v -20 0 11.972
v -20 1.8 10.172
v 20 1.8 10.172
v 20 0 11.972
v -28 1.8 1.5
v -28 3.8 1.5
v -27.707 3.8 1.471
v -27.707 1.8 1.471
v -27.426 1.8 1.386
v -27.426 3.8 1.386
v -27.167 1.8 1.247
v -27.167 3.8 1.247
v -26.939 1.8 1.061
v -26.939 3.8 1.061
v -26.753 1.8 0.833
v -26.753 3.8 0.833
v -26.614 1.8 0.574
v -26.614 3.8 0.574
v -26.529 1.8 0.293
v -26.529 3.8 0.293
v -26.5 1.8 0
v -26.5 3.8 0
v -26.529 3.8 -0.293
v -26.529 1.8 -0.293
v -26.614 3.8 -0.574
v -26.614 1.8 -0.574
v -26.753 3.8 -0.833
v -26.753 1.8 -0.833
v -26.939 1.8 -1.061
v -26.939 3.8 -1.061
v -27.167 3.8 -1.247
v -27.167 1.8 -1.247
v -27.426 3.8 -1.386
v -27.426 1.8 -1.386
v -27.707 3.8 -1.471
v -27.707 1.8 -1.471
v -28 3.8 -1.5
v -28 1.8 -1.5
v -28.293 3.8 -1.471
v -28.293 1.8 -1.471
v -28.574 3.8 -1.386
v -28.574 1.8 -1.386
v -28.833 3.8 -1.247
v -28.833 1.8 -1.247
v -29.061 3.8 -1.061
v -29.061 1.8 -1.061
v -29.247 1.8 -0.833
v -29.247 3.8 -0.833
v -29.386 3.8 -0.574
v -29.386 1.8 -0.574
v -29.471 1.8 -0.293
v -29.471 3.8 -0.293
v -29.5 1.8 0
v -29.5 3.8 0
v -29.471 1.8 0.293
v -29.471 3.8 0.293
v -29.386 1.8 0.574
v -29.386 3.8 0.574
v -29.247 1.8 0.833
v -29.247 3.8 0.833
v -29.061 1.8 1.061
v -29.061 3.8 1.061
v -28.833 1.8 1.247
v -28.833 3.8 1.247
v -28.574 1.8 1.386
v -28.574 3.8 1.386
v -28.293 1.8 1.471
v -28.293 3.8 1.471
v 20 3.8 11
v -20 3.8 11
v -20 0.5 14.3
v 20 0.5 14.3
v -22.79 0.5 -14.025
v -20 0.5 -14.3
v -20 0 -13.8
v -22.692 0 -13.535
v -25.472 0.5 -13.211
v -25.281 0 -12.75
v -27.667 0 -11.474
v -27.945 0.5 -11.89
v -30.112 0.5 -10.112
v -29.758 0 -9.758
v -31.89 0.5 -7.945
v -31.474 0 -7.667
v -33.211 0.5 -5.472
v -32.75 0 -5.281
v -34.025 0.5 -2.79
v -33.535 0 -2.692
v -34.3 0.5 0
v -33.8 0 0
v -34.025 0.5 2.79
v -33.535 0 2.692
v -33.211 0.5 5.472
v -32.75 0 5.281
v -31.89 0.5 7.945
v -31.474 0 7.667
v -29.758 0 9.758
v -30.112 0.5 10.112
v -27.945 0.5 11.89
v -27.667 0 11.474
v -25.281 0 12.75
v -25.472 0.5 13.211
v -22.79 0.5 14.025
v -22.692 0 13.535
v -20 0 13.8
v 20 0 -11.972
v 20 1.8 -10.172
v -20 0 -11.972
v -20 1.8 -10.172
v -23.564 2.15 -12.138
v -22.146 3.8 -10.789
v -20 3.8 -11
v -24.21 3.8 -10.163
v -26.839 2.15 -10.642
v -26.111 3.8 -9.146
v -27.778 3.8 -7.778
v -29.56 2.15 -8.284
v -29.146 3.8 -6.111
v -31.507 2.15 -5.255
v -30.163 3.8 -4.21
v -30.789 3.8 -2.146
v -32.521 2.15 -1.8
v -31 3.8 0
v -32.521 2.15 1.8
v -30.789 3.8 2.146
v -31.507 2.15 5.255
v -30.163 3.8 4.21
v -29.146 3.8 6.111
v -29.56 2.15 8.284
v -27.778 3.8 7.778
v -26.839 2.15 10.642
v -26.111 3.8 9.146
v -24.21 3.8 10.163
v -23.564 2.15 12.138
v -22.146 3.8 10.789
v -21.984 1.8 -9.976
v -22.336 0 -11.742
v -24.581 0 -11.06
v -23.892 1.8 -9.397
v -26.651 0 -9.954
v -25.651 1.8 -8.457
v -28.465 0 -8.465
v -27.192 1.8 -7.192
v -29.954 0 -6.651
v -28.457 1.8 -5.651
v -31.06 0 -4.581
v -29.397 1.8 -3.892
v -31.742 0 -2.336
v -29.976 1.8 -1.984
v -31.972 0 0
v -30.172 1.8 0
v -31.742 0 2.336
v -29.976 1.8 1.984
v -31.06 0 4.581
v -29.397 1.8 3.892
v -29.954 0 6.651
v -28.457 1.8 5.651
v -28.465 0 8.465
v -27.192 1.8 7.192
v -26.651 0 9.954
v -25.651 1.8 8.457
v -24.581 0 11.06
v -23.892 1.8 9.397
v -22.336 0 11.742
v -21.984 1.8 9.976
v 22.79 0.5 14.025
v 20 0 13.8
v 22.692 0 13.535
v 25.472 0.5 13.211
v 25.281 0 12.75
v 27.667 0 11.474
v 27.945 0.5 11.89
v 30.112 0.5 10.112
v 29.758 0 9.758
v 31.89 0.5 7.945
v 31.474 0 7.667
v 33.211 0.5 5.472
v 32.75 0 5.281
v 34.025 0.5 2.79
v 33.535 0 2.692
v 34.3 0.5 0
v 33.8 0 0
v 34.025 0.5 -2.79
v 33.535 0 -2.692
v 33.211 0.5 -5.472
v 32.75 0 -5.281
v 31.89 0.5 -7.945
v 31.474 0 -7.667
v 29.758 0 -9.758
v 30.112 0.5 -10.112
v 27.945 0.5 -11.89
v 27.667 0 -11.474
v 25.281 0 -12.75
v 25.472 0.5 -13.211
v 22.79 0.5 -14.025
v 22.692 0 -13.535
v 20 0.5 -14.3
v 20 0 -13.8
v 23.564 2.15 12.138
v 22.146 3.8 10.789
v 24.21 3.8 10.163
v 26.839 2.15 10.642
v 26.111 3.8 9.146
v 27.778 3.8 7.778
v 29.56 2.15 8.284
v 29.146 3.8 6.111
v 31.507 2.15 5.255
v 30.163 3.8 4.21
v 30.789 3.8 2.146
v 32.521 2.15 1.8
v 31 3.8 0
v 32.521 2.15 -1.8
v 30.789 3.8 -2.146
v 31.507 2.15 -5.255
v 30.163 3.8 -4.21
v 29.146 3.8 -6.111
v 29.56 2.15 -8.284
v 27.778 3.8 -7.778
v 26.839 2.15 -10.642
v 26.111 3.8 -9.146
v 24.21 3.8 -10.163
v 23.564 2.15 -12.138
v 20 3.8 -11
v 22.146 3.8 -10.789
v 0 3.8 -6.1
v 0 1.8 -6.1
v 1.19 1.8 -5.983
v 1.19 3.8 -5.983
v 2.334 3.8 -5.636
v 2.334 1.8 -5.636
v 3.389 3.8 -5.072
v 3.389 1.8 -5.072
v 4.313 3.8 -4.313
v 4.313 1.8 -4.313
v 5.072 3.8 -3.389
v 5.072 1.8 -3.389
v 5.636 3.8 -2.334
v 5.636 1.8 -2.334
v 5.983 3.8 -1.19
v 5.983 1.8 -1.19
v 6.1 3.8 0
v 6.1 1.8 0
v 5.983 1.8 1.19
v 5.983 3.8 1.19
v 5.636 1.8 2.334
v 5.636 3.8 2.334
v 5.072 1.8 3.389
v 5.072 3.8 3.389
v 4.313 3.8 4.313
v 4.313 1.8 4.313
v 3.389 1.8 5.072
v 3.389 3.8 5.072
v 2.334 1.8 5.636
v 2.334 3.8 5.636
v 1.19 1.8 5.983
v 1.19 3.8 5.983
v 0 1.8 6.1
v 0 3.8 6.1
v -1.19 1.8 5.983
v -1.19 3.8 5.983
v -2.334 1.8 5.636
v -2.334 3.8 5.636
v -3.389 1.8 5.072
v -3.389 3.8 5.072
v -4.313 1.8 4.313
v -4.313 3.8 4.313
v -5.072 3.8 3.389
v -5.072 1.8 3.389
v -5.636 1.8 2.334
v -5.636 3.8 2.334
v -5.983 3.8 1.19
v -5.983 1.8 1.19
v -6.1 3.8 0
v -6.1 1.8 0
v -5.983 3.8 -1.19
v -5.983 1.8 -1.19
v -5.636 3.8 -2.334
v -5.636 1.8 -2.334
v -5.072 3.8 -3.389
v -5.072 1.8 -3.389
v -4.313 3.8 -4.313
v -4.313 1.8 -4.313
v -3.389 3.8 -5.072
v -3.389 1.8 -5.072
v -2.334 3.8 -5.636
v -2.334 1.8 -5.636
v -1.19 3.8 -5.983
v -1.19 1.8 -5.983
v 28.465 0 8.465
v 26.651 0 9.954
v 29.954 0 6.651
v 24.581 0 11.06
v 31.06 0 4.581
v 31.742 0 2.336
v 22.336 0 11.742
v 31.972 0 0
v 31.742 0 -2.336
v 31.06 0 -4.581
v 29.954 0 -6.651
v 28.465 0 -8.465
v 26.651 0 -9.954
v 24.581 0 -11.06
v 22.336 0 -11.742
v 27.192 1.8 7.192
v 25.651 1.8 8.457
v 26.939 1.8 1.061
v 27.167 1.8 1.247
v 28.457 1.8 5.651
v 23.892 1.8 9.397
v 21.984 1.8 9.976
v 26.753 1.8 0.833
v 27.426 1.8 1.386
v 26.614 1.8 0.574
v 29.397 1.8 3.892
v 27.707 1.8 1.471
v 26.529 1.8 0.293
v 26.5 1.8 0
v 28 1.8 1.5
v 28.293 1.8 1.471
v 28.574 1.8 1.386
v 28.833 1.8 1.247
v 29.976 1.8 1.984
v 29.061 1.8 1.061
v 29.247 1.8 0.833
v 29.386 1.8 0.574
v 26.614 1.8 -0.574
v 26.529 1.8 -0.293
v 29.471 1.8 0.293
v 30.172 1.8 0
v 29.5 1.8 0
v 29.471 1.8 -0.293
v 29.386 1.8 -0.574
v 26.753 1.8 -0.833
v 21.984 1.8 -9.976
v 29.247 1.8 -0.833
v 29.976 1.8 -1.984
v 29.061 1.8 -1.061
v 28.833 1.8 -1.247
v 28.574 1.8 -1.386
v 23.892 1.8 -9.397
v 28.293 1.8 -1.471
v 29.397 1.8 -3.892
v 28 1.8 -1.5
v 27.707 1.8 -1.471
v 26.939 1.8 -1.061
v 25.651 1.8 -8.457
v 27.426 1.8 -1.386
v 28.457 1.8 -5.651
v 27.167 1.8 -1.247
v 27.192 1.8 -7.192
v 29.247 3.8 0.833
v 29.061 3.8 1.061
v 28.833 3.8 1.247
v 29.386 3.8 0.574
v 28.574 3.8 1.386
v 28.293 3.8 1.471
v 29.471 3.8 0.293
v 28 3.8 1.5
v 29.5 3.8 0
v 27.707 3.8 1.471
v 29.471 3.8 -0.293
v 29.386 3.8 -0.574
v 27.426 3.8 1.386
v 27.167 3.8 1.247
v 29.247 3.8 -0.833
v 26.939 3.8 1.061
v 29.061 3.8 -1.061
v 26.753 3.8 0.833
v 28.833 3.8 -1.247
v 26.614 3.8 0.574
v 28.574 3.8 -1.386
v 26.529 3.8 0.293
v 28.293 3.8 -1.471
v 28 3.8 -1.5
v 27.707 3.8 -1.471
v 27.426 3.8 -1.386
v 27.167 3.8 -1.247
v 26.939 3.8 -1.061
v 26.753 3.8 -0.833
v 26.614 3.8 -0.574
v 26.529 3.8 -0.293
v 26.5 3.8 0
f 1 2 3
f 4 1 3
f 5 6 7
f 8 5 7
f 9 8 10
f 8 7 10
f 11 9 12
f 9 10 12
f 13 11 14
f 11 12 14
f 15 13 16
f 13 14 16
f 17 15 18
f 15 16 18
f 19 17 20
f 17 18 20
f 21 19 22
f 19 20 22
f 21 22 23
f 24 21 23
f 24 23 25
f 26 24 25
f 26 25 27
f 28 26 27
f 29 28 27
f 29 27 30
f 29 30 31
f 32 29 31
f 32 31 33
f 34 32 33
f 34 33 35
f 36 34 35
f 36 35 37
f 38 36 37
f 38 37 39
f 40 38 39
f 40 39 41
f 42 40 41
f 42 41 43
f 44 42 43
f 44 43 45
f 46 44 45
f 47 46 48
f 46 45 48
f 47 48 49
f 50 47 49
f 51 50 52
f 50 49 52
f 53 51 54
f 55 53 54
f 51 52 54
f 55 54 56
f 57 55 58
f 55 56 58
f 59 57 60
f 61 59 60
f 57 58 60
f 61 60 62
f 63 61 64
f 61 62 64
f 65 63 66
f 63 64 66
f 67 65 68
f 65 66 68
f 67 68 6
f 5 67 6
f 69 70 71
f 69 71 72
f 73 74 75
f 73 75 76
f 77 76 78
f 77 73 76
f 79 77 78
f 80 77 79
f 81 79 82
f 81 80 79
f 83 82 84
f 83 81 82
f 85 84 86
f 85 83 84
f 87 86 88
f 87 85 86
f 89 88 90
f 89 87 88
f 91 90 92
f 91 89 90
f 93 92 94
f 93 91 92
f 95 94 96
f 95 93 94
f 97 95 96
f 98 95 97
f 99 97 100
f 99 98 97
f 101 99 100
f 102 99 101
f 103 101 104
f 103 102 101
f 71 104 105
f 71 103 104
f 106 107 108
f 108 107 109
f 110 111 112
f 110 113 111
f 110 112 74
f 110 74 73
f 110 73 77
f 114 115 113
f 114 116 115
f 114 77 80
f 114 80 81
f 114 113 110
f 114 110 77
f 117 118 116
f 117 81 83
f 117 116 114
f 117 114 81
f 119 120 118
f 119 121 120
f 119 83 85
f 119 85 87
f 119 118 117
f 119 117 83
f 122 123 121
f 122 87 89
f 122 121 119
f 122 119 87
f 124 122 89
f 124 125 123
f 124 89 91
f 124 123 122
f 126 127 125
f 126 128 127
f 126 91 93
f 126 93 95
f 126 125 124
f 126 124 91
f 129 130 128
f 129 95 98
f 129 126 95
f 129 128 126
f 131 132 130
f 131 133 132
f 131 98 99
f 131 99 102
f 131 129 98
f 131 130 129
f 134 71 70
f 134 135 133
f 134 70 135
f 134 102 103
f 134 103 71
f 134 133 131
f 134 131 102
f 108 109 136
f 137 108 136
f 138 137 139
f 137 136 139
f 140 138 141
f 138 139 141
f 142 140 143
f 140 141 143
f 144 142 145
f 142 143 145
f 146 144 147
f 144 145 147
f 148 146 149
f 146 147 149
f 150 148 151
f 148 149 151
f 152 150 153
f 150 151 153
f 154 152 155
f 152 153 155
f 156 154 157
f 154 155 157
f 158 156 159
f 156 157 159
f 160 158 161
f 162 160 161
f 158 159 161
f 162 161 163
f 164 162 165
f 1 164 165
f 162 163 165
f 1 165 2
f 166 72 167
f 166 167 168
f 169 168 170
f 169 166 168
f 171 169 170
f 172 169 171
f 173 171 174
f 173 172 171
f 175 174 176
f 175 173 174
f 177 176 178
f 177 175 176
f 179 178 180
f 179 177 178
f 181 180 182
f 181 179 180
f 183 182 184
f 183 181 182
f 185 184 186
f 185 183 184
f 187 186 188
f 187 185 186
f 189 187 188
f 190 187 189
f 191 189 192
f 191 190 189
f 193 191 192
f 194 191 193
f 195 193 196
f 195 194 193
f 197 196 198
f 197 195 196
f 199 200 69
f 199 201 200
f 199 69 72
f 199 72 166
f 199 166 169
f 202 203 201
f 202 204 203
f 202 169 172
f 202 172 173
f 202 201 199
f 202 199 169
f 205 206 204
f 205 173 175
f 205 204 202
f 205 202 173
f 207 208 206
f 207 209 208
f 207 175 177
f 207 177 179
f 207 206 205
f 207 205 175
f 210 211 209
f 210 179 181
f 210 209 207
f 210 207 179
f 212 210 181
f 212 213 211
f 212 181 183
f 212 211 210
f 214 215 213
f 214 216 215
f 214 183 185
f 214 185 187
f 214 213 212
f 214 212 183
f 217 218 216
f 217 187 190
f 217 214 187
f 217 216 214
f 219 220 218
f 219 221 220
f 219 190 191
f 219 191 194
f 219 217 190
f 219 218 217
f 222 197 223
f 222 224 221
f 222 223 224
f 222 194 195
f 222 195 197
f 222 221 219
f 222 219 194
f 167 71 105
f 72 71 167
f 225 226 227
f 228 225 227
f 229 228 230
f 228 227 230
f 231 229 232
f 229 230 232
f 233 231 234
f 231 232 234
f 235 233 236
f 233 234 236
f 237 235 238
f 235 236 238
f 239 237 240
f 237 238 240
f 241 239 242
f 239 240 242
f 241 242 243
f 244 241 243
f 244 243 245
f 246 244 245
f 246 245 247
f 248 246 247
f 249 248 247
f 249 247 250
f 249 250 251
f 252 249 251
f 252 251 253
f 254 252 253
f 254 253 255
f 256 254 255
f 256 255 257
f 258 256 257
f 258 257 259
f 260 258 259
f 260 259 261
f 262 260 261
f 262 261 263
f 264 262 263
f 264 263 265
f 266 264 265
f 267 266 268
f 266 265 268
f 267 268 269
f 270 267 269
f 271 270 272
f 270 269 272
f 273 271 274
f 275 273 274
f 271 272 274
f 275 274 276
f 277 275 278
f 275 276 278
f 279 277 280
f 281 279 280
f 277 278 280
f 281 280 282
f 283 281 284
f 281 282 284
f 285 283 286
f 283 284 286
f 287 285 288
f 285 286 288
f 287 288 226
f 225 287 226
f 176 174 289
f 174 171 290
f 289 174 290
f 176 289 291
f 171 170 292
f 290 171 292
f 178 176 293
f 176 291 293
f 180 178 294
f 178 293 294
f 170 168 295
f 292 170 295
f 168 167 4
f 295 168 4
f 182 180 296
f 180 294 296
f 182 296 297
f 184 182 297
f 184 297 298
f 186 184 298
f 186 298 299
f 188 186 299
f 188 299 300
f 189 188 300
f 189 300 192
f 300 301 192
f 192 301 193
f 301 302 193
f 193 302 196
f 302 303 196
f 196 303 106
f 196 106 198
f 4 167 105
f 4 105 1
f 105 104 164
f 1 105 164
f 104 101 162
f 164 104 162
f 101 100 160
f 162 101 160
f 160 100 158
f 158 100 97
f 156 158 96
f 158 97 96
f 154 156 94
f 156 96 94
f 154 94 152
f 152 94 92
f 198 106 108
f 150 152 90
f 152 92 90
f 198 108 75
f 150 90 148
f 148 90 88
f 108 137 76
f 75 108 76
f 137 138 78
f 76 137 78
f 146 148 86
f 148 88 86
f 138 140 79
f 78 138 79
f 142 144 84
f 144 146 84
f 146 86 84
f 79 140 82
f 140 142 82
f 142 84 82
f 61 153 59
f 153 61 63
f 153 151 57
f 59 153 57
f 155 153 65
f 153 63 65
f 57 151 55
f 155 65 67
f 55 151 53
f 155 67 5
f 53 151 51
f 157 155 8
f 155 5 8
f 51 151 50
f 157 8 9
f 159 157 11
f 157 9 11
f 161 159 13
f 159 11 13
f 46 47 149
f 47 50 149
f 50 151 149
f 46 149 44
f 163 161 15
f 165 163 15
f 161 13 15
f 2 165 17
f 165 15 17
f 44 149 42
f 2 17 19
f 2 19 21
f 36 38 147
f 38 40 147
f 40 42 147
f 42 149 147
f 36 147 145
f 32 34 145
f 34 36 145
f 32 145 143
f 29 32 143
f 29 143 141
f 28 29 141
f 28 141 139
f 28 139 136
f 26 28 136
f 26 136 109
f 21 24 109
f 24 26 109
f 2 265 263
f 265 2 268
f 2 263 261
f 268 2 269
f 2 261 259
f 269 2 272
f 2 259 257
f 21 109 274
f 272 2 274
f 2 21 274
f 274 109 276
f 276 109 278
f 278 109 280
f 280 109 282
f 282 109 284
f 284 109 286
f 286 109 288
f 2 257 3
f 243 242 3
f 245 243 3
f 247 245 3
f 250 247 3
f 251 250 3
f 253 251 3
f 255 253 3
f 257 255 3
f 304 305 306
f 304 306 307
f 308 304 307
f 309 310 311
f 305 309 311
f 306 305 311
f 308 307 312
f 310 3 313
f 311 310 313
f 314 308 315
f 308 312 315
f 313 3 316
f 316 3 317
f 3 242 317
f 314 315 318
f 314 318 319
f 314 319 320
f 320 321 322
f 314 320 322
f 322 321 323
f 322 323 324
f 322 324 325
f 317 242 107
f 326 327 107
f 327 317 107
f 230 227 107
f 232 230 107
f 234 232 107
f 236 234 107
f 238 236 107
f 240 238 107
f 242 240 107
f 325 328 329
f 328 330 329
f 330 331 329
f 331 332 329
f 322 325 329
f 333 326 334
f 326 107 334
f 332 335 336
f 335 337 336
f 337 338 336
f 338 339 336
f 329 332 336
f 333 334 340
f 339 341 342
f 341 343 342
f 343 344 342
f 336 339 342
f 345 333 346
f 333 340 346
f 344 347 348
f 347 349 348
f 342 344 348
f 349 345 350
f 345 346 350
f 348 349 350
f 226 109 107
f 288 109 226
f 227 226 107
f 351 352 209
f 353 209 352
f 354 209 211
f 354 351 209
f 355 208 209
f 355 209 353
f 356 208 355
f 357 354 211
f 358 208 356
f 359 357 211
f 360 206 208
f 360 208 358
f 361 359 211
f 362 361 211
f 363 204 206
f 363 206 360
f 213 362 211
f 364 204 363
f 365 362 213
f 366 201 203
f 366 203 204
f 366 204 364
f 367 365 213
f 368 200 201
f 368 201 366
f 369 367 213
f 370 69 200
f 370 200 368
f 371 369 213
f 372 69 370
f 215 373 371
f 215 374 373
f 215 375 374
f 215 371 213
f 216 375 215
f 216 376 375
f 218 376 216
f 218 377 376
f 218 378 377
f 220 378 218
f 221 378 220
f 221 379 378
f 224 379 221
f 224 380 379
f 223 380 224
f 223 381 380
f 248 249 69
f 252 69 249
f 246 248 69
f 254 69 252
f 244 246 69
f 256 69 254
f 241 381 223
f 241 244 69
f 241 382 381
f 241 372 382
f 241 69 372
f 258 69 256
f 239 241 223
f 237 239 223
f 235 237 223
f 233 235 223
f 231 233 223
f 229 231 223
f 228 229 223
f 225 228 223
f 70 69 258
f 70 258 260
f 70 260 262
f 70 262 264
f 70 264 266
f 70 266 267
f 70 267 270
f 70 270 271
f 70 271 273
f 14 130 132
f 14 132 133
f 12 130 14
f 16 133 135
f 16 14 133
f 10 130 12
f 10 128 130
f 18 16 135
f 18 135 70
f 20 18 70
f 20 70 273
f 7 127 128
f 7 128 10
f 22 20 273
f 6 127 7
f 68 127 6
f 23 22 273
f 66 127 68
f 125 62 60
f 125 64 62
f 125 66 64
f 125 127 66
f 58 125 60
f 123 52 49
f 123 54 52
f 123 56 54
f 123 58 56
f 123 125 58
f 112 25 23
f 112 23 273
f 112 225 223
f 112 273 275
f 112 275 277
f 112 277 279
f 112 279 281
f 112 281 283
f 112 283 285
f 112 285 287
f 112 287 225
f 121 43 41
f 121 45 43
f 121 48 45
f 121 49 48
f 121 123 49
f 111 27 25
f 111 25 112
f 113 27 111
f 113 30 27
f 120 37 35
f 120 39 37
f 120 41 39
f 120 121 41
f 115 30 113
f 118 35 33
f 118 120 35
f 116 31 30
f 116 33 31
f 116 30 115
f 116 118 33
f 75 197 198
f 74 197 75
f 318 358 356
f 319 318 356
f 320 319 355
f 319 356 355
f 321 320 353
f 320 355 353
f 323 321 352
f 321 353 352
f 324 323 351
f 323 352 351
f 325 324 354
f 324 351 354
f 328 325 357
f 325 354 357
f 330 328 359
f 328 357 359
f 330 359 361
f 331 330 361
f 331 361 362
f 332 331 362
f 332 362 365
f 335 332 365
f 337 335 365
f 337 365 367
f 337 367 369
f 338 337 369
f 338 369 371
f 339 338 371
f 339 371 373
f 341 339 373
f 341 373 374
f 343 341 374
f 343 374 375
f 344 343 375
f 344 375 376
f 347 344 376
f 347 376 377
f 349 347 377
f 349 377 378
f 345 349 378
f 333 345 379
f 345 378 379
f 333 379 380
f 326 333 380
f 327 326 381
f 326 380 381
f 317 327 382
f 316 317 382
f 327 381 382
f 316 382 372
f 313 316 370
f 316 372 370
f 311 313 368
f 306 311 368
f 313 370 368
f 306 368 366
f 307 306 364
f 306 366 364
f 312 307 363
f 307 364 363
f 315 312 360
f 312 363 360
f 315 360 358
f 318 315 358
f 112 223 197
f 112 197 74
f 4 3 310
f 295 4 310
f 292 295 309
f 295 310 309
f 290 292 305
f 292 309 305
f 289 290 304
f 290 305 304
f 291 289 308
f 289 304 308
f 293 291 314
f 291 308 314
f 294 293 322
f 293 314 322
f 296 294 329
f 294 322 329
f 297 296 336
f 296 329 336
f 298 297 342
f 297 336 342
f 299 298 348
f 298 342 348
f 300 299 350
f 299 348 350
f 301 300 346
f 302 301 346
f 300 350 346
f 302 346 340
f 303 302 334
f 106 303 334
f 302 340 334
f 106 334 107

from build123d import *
from OCP.BRepFilletAPI import BRepFilletAPI_MakeChamfer

# Parameters (mm, degrees)
BOSS_EXTRU_1_DEPTH      = 3.8
BOSS_EXTRU_1_TAPER      = 45
COQUE2_DEPTH            = 1.8
COQUE2_DRAFT            = 45
CHANFREIN1_SIZE         = 1
CHANFREIN1_SIZE2        = 0.707106781
ENL_V_MAT_EXTRU_1_REACH = 39.355
ESQUISSE2_R             = 1.5
ENL_V_MAT_EXTRU_2_REACH = 39.215
ESQUISSE3_R             = 6.1


# Read off the part's stored shape, not the designer's step: Coque2
with BuildPart() as part:
    # Esquisse1 → Boss.-Extru.1 (new body)
    with BuildSketch(Plane(origin=(0, 0, 0), x_dir=(1, 0, 0), z_dir=(0, 1, 0))):
        with BuildLine():
            ThreePointArc((-20, 14.8), (-34.8, 0), (-20, -14.8))
            Line((-20, -14.8), (20, -14.8))
            ThreePointArc((20, -14.8), (34.8, 0), (20, 14.8))
            Line((20, 14.8), (-20, 14.8))
        make_face()
    extrude(amount=BOSS_EXTRU_1_DEPTH, taper=BOSS_EXTRU_1_TAPER)


with BuildPart() as coque2_tool:
    # Coque2 outline → Coque2 (with draft: the straight prism first)
    with BuildSketch(Plane(origin=(0, 1.8, 0), x_dir=(1, 0, 0), z_dir=(0, 1, 0))):
        with BuildLine():
            Line((-20, -10.171572875), (20, -10.171572875))
            ThreePointArc((20, -10.171572875), (30.171572875, 0), (20, 10.171572875))
            Line((20, 10.171572875), (-20, 10.171572875))
            ThreePointArc((-20, 10.171572875), (-30.171572875, 0), (-20, -10.171572875))
        make_face()
    extrude(amount=-COQUE2_DEPTH)
    # Coque2: the draft: its side faces are tilted about the plane it starts from
    coque2_sides = [coque2_tool.faces().sort_by_distance(p)[0] for p in [
        (0, 0.9, 10.171572875),
        (30.171572875, 0.9, 0),
        (0, 0.9, -10.171572875),
        (-30.171572875, 0.9, 0),
    ]]
    draft(coque2_sides, Plane(origin=(0, 1.8, 0), x_dir=(1, 0, 0), z_dir=(0, 1, 0)), COQUE2_DRAFT)


with BuildPart() as part_1:
    add(part.part)

    # Coque2: cut by coque2_tool
    add(coque2_tool.part, mode=Mode.SUBTRACT)

    # Chanfrein1: one chamfer whose edges measure the first distance from different faces: ONE call of the kernel's chamfer builder (chamfer() names one face for all edges)
    chanfrein1_edges_1 = [part_1.edges().sort_by_distance(p)[0] for p in [
        (0, 0, -14.8),
        (0, 0, 14.8),
        (-34.8, 0, 0),
    ]]
    chanfrein1_side_1 = [part_1.faces().sort_by_distance(p)[0] for p in [
        (0, 0, -14.043672029),
    ]]
    chanfrein1_edges_2 = [part_1.edges().sort_by_distance(p)[0] for p in [
        (34.8, 0, 0),
    ]]
    chanfrein1_side_2 = [part_1.faces().sort_by_distance(p)[0] for p in [
        (32.9, 1.9, 0),
    ]]
    chanfrein1 = BRepFilletAPI_MakeChamfer(part_1.part.solid().wrapped)
    for e in chanfrein1_edges_1:
        chanfrein1.Add(CHANFREIN1_SIZE, CHANFREIN1_SIZE2, e.wrapped, chanfrein1_side_1[0].wrapped)  # the first distance lies on this face
    for e in chanfrein1_edges_2:
        chanfrein1.Add(CHANFREIN1_SIZE, CHANFREIN1_SIZE2, e.wrapped, chanfrein1_side_2[0].wrapped)  # the first distance lies on this face
    add(Compound.cast(chanfrein1.Shape()), mode=Mode.REPLACE)

    # Esquisse2 → Enlèv. mat.-Extru.1 (cut, up to next)
    with BuildSketch(Plane(origin=(0, 3.8, 0), x_dir=(1, 0, 0), z_dir=(0, 1, 0)), mode=Mode.PRIVATE) as enl_v_mat_extru_1_sk1:
        with Locations(Location((-28, 0, 0), (0, 0, 270))):
            Circle(ESQUISSE2_R)
    enl_v_mat_extru_1_tool1 = extrude(enl_v_mat_extru_1_sk1.sketch, amount=-ENL_V_MAT_EXTRU_1_REACH, mode=Mode.PRIVATE) & part_1.part
    # Esquisse2 → Enlèv. mat.-Extru.1 (cut, up to next)
    with BuildSketch(Plane(origin=(0, 3.8, 0), x_dir=(1, 0, 0), z_dir=(0, 1, 0)), mode=Mode.PRIVATE) as enl_v_mat_extru_1_sk2:
        with Locations(Location((28, 0, 0), (0, 0, 270))):
            Circle(ESQUISSE2_R)
    enl_v_mat_extru_1_tool2 = extrude(enl_v_mat_extru_1_sk2.sketch, amount=-ENL_V_MAT_EXTRU_1_REACH, mode=Mode.PRIVATE) & part_1.part
    add(enl_v_mat_extru_1_tool1.solids().sort_by_distance((-28, 3.8, 0))[0], mode=Mode.SUBTRACT)
    add(enl_v_mat_extru_1_tool2.solids().sort_by_distance((28, 3.8, 0))[0], mode=Mode.SUBTRACT)

    # Esquisse3 → Enlèv. mat.-Extru.2 (cut, up to next)
    with BuildSketch(Plane.XZ.offset(-1.8), mode=Mode.PRIVATE) as enl_v_mat_extru_2_sk1:
        with Locations(Location((0, 0, 0), (0, 0, 270))):
            Circle(ESQUISSE3_R)
    enl_v_mat_extru_2_tool1 = extrude(enl_v_mat_extru_2_sk1.sketch, amount=-ENL_V_MAT_EXTRU_2_REACH, mode=Mode.PRIVATE) & part_1.part
    add(enl_v_mat_extru_2_tool1.solids().sort_by_distance((0, 1.8, 0))[0], mode=Mode.SUBTRACT)


solid = part_1.part
